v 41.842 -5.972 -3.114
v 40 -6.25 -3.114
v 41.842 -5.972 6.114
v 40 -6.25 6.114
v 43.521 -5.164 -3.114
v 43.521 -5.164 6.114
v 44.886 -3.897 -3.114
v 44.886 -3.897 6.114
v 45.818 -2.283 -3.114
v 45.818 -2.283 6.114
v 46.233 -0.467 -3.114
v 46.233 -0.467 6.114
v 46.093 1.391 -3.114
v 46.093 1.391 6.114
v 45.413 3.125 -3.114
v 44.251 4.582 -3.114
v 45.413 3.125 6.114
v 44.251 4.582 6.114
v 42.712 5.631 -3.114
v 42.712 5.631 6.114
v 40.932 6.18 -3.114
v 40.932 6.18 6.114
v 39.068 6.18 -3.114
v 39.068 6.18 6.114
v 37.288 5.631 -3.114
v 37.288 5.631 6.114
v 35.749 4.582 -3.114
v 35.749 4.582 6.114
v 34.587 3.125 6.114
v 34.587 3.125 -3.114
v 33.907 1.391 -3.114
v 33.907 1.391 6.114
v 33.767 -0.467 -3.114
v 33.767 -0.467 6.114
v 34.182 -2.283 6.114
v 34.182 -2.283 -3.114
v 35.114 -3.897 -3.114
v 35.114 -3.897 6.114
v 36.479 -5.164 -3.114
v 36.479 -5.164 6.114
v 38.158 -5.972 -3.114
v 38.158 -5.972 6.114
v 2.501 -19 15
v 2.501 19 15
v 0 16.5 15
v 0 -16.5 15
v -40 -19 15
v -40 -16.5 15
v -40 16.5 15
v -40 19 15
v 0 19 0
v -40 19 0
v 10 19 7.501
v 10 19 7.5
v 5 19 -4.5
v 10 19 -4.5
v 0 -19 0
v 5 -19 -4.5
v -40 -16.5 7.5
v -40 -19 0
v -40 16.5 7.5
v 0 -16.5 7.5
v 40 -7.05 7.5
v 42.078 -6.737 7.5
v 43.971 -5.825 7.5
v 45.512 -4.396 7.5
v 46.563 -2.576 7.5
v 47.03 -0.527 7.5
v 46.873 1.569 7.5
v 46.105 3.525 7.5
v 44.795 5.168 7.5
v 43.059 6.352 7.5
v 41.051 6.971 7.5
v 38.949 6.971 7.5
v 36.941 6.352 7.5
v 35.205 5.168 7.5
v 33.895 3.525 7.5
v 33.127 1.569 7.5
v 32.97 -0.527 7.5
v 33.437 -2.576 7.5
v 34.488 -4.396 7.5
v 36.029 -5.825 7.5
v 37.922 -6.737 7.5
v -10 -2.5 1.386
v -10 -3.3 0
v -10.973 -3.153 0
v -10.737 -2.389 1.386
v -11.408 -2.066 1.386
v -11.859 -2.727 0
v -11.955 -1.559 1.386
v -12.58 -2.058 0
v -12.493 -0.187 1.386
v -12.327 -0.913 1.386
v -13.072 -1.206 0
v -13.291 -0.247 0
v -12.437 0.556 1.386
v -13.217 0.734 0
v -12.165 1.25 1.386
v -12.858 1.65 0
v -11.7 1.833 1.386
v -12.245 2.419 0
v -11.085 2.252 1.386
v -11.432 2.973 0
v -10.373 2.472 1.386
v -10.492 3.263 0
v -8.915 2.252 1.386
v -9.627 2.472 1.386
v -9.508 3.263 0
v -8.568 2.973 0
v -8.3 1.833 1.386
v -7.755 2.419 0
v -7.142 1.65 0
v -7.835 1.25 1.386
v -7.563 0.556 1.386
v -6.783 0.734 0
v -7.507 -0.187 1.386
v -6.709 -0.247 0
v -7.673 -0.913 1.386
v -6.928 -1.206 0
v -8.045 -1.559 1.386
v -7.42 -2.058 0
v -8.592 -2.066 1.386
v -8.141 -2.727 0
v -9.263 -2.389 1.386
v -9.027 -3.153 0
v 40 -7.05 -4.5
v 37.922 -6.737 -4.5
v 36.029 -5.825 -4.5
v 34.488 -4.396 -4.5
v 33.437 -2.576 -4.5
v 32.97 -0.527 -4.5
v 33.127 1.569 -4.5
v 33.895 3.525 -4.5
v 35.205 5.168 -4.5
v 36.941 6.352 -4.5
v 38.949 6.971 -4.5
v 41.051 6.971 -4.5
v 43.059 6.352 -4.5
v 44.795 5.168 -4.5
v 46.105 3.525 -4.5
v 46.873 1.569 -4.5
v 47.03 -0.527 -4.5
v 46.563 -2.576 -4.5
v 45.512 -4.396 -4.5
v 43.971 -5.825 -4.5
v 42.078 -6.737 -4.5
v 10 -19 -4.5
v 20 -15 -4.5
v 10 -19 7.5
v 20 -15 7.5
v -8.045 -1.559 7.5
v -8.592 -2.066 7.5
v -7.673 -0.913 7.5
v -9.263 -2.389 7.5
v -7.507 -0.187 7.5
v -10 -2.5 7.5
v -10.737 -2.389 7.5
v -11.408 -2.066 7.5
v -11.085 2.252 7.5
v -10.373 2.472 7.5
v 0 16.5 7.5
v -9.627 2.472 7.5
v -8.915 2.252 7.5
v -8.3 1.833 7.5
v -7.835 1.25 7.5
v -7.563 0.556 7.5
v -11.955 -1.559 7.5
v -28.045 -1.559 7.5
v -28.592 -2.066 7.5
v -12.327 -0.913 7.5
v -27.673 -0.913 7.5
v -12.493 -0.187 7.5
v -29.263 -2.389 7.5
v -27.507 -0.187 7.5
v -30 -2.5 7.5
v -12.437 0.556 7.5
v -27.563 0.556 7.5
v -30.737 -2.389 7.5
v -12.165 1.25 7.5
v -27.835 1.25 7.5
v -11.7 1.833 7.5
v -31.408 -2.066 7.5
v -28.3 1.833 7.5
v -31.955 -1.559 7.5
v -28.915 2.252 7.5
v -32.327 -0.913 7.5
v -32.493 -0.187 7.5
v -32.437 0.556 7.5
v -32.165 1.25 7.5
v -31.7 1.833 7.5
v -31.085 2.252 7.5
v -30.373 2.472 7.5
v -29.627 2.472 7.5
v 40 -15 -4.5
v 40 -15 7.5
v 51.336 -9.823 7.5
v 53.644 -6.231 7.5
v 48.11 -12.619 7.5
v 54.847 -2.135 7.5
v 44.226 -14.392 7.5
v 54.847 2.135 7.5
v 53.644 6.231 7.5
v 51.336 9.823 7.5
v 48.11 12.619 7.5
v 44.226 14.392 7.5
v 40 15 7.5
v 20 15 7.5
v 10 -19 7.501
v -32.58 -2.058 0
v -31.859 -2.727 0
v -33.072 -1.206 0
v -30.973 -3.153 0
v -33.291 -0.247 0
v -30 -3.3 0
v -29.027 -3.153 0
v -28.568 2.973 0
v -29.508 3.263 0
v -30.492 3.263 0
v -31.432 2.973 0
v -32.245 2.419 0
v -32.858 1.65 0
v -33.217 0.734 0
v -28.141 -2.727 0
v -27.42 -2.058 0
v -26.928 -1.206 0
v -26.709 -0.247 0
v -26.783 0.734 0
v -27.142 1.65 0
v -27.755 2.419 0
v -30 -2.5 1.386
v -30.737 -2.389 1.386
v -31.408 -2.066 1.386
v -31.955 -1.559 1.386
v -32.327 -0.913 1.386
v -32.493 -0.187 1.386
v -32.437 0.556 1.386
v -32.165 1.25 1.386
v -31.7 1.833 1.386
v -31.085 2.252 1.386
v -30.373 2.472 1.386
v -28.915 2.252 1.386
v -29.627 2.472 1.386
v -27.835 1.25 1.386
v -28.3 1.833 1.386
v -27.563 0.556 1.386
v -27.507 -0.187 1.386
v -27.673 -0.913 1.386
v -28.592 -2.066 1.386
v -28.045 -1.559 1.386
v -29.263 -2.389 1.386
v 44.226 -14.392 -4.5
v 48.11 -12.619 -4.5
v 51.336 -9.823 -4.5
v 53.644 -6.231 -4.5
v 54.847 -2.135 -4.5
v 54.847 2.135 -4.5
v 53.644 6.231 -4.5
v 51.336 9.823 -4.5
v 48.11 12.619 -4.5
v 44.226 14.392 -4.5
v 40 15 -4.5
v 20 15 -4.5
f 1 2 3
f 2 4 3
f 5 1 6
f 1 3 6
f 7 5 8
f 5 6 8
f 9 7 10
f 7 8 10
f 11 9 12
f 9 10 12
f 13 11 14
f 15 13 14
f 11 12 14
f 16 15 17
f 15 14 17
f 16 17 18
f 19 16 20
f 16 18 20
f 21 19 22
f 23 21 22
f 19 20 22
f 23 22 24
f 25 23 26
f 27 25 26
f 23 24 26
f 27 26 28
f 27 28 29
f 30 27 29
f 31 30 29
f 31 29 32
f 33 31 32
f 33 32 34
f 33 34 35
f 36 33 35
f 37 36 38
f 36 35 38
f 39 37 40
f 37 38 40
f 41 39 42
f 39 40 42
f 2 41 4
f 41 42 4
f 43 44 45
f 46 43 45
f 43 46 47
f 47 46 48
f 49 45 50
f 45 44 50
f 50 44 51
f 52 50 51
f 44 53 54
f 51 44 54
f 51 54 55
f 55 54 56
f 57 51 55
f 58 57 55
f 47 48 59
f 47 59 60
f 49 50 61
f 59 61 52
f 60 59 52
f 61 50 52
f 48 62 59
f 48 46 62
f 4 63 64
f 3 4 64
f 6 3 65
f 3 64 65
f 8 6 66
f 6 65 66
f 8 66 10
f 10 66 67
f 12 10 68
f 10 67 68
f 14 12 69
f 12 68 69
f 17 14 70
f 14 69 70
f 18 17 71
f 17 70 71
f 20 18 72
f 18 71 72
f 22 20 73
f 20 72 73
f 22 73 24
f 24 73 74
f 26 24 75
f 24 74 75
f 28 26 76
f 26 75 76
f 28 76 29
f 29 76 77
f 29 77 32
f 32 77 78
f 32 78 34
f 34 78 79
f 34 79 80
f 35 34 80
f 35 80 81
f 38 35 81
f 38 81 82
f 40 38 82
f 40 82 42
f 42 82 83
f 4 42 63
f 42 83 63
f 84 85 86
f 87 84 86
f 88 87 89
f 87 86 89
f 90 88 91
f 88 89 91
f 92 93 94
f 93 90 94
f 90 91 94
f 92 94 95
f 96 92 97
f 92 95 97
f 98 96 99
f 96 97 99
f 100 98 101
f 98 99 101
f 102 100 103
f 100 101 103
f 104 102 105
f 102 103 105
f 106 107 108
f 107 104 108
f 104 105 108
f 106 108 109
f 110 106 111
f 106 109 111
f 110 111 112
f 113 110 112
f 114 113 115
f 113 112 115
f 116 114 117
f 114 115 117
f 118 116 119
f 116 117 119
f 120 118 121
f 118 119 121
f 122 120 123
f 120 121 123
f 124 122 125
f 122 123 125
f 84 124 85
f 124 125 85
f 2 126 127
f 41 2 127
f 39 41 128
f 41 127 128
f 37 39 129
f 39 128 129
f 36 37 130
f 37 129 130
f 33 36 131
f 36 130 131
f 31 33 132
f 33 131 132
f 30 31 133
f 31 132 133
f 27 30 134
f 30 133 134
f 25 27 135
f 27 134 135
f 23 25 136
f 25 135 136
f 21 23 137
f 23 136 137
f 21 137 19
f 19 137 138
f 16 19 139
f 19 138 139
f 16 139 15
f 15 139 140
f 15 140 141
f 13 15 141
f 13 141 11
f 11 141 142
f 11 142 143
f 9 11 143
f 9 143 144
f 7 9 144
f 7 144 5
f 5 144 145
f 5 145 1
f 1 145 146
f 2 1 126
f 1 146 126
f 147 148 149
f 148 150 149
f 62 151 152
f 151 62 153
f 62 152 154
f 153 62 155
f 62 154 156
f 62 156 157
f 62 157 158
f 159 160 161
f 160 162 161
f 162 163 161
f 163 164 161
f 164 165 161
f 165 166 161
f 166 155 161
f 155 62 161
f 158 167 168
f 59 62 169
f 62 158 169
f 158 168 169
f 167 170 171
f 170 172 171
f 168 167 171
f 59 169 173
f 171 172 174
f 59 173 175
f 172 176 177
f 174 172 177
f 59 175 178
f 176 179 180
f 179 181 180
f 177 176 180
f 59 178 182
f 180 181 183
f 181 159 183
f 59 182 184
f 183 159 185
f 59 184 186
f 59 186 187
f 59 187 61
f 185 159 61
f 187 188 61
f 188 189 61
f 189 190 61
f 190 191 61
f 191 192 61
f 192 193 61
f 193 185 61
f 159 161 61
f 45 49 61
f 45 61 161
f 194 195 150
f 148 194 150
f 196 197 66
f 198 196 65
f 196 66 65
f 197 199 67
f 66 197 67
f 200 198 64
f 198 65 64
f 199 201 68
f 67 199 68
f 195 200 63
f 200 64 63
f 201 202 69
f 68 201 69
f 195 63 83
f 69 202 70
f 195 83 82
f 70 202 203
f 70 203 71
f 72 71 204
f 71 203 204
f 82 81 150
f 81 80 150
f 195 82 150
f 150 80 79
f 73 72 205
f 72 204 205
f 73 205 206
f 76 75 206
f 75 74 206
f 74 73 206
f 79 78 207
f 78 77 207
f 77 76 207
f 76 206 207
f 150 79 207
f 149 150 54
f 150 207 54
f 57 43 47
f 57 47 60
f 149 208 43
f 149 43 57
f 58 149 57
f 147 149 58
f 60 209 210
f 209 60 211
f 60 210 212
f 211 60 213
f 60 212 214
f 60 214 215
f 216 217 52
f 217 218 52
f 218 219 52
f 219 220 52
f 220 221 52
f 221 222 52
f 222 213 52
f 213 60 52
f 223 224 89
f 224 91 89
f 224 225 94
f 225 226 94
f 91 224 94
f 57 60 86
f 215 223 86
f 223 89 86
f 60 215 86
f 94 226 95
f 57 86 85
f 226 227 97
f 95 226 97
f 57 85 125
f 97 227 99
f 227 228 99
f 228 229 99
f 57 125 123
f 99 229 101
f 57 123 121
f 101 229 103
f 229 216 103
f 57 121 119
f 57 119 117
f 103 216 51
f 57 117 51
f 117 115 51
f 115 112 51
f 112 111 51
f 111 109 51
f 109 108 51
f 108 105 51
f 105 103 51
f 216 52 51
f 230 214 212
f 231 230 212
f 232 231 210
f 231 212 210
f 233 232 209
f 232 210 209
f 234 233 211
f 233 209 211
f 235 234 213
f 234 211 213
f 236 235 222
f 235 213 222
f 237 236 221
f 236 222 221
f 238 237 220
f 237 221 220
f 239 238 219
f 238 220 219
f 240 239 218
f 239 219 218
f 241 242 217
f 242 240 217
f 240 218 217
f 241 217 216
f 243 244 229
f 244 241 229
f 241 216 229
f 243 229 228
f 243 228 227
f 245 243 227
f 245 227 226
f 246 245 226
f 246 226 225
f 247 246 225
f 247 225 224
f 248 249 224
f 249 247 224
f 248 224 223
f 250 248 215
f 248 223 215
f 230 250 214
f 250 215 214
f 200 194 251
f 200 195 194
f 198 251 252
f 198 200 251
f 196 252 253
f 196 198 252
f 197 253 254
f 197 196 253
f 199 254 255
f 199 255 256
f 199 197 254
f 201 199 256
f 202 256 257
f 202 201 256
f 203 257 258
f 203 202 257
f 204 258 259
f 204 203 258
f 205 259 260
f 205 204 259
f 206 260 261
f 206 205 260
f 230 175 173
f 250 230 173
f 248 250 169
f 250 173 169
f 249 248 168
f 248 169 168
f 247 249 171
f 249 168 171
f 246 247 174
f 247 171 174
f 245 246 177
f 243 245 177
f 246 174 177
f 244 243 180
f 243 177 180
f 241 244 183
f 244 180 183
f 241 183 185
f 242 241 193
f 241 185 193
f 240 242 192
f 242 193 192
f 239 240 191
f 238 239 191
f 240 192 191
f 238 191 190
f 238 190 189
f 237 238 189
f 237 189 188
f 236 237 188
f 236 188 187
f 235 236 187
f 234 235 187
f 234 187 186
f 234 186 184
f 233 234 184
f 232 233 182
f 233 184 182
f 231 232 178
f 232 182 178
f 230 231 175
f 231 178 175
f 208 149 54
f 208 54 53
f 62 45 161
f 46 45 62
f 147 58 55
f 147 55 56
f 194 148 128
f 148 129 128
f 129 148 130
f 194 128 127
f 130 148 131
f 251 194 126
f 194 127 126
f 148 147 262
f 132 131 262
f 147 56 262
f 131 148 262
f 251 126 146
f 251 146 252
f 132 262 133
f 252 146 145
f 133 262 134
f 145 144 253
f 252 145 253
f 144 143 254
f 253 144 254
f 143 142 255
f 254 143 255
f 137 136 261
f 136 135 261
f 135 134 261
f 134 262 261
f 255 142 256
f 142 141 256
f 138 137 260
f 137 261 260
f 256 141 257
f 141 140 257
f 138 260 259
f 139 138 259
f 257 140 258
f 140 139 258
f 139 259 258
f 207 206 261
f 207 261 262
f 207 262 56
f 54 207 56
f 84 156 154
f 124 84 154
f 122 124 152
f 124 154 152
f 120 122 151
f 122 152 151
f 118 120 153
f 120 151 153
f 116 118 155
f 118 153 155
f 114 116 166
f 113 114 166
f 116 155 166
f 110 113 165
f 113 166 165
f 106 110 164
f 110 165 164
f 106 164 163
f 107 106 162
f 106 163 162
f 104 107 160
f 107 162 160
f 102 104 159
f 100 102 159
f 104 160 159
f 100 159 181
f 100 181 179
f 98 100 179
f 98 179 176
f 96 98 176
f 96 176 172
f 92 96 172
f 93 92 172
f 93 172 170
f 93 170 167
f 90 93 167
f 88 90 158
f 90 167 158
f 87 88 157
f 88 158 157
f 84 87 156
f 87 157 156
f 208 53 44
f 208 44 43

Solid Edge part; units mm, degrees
sketch "Sketch1" plane through (0, 0, 0) normal (0, -1, 0) x (1, 0, 0)
  line L0 (-40, 15) -> (-40, 0)
  line L1 (-40, 0) -> (0, 0)
  line L2 (0, 0) -> (5, -4.5)
  line L3 (5, -4.5) -> (60, -4.5)
  line L4 (60, -4.5) -> (60, 7.5)
  line L5 (60, 7.5) -> (10, 7.5)
  line L6 (10, 7.5) -> (10, 15)
  line L7 (10, 15) -> (-40, 15)
  dimension "D1" = 15
  dimension "D2" = 40
  dimension "D3" = 7.5
  dimension "D4" = 50
  dimension "D5" = 50
  dimension "D6" = 12
  dimension "D7" = 5
extrude "Protrusion1" add sketch "Sketch1" along normal mid plane 38
sketch "Sketch2" plane through (-15, 0, 15) normal (0, 0, 1) x (1, 0, 0)
  line L0 (-25, 16.5) -> (15, 16.5)
  line L1 (15, 16.5) -> (15, -16.5)
  line L2 (15, -16.5) -> (-25, -16.5)
  line L3 (-25, -16.5) -> (-25, 16.5)
  dimension "D1" = 33
extrude "ExtrudedCutout_1" cut sketch "Sketch2" against normal blind 7.5
hole "Hole_1" at (-10, 0, 7.5) direction (0, 0, -1) diameter 5 end up to next
hole "Hole1" at (-30, 0, 7.5) direction (0, 0, -1) diameter 5 end up to next
hole "Hole_3" at (40, 0, 7.5) direction (0, 0, -1) diameter 12.5 end up to next
sketch "Sketch3" plane through (35, 0, 7.5) normal (0, 0, 1) x (-1, 0, 0)
  line L0 (15, -15) -> (25, -19)
  line L1 (-5, -15) -> (15, -15)
  arc A0 (-5, 15) -> (-5, -15) centre (-5, 0) ccw
  line L2 (-5, 15) -> (15, 15)
  line L3 (15, 15) -> (25, 19)
  dimension "D1" = 55
  dimension "D2" = 10
extrude "Cutout1" cut sketch "Sketch3" against normal through all material side at (15.0186, 17.0464, 7.5)
chamfer "Chamfer_1" distance 7.5 angle 45 1 edges at (10, 0, 15)
chamfer "Chamfer_2" distance 0.8 angle 60 4 edges at (33.75, 0, -4.5) (46.25, 0, 7.5) (-12.5, 0, 0) (-32.5, 0, 0) measured on face at (47.95, -12.2867, 7.5) measured on face at (12.8333, -12.2867, -4.5) measured on face at (-33.7333, -12.2867, 0)
properties material "Polyethylene, low density"
